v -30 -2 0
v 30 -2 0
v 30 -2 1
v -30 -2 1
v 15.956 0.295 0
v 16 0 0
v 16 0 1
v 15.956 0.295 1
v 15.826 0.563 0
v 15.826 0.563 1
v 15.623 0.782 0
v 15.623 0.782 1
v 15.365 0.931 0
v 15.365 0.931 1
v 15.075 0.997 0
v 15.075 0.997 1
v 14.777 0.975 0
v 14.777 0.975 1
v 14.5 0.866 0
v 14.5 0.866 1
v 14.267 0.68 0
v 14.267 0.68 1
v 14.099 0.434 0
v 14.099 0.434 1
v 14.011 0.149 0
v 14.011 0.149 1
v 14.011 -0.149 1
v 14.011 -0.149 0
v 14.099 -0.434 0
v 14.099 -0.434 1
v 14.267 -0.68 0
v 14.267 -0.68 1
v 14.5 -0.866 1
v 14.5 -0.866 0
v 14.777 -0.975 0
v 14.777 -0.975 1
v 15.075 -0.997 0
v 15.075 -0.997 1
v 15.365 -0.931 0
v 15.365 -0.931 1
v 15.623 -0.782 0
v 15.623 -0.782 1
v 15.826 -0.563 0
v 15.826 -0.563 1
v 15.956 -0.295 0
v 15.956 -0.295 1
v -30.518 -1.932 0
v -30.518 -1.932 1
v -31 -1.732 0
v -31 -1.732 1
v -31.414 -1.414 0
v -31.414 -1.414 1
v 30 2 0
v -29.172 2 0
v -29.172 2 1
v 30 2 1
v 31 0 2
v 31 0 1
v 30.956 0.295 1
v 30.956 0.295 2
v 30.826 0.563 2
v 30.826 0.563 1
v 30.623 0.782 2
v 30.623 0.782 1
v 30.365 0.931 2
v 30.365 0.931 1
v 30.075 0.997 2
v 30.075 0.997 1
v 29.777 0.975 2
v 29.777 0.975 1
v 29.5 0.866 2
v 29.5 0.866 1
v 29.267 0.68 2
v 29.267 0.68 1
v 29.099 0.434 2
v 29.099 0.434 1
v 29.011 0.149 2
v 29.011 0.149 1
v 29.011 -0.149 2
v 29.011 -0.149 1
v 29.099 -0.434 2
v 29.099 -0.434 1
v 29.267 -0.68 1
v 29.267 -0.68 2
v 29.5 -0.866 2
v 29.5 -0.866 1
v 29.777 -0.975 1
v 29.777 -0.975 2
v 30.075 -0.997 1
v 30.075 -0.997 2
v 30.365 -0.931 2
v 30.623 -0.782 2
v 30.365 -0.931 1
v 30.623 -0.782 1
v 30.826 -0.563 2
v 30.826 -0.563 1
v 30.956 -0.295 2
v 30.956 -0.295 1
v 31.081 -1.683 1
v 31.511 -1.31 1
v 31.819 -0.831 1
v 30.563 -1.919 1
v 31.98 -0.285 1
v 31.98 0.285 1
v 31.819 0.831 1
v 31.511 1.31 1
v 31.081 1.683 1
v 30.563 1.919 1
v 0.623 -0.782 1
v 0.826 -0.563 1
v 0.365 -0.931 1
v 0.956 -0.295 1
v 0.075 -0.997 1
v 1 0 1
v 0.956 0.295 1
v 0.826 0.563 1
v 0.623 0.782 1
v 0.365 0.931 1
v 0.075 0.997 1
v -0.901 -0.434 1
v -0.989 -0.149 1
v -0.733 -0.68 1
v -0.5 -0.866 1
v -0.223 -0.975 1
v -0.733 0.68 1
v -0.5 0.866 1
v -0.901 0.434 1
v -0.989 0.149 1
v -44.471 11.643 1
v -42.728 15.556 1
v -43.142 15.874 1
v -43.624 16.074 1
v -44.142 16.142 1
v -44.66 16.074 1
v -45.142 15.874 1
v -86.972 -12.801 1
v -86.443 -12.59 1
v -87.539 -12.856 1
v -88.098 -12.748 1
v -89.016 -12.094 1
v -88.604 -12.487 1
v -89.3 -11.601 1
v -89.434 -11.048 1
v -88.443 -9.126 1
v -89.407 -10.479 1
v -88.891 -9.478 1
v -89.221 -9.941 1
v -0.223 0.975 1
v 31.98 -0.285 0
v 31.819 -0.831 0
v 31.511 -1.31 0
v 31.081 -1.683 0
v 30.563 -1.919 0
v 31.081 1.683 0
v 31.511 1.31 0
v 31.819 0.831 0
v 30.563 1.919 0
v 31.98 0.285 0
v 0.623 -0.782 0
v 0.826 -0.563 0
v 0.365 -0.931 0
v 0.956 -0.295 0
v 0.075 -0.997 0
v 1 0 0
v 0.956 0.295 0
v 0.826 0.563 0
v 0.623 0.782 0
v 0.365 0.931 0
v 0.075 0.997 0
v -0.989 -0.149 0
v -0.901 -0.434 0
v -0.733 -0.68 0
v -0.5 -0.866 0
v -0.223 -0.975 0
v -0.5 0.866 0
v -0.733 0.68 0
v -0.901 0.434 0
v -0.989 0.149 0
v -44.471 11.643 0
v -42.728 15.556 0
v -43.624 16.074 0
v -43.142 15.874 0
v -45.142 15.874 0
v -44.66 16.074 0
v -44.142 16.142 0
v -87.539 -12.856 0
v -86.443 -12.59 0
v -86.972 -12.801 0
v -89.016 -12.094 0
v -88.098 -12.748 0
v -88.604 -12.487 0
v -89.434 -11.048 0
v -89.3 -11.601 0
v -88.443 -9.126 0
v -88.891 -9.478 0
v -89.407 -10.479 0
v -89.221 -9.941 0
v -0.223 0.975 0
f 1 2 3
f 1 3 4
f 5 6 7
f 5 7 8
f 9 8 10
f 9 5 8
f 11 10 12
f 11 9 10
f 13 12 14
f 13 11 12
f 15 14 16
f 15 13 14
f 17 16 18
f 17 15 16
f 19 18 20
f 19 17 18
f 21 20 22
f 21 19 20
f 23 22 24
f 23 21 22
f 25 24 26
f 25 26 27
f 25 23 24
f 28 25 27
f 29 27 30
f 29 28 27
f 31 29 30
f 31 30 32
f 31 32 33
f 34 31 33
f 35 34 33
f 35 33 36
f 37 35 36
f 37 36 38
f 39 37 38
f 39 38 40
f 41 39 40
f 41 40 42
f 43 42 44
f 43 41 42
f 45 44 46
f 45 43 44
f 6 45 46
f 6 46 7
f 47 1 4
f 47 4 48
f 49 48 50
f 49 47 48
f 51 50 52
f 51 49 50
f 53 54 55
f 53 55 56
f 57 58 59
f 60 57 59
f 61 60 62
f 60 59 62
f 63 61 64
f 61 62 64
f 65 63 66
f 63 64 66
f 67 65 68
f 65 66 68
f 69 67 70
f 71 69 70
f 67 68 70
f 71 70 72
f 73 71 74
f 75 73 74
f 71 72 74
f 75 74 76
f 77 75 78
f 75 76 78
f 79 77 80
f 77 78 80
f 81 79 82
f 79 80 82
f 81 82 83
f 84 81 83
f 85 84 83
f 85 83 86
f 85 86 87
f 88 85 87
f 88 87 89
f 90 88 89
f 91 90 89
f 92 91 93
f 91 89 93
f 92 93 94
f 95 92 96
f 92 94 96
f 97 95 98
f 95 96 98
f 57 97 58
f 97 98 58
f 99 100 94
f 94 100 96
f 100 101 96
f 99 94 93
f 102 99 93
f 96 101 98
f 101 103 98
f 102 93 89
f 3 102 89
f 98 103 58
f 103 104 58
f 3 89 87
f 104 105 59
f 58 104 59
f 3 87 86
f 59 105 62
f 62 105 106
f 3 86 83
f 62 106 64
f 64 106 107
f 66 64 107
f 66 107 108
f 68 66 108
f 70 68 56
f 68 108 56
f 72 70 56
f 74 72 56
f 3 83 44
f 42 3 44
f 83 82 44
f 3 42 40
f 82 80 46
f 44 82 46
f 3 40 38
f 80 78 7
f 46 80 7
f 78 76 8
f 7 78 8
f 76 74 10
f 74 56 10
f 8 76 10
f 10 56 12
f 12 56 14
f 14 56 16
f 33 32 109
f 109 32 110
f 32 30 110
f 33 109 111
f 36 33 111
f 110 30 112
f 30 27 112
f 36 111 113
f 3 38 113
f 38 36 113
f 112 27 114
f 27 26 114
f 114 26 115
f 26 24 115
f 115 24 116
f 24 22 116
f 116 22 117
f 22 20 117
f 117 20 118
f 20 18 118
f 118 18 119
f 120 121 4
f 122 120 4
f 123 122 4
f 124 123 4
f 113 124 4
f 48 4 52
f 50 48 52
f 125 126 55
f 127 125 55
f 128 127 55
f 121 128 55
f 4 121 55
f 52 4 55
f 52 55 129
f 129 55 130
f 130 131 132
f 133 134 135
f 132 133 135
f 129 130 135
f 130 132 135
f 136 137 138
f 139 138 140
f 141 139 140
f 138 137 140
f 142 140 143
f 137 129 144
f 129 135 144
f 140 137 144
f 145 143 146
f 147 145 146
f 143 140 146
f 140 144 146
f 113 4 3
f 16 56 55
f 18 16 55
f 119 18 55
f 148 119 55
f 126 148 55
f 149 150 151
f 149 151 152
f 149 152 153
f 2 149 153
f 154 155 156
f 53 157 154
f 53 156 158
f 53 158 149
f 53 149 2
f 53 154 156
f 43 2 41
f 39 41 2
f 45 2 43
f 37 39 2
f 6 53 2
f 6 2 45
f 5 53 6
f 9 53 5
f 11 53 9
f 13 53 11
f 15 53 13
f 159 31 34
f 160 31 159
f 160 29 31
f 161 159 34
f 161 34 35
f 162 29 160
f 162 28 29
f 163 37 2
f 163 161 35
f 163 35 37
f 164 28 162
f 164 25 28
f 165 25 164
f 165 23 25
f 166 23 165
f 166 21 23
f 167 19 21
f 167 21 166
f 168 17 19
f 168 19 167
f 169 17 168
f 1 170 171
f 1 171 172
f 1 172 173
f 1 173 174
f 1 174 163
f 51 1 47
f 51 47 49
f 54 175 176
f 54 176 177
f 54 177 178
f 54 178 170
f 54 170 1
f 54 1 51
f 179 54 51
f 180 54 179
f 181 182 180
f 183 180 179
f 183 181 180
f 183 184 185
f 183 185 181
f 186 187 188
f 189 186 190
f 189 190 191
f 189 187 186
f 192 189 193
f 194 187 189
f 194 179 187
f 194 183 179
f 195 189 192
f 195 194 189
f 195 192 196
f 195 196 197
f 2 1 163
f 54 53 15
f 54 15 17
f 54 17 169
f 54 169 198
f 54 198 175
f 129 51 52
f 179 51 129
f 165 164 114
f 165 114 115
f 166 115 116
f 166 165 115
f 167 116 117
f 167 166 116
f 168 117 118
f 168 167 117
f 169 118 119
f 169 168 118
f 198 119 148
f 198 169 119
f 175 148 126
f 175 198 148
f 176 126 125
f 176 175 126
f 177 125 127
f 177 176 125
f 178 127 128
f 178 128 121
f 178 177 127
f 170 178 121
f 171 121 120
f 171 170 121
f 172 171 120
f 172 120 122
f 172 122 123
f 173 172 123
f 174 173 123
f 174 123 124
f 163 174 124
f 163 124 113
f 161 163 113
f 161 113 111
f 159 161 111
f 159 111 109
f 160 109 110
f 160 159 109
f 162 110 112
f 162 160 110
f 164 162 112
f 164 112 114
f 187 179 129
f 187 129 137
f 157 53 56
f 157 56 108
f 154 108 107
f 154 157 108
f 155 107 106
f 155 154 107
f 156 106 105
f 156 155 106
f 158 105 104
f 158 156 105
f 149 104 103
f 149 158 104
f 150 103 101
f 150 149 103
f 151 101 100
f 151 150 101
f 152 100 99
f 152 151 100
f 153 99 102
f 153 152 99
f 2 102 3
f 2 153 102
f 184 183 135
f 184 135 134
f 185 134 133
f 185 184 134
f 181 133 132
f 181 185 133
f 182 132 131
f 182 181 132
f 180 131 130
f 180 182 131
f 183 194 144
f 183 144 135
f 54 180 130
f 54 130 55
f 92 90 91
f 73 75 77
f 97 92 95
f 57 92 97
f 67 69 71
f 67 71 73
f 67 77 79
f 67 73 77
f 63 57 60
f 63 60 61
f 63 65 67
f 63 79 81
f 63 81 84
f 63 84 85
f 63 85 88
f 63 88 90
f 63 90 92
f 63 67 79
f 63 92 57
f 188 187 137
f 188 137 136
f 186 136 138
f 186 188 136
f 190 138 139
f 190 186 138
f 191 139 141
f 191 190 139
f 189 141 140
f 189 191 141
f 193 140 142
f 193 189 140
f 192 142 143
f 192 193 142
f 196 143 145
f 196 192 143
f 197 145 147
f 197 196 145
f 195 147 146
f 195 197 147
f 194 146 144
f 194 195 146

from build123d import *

# Parameters (mm, degrees)
SKETCH_1_R      = 1
EXTRUDE_1_DEPTH = 1
SKETCH_2_R      = 1
EXTRUDE_2_DEPTH = 1


with BuildPart() as part:
    # 草图1 → 凸台-拉伸1 (new body)
    with BuildSketch(Plane.XY):
        with BuildLine():
            Line((0, 2), (30, 2))
            ThreePointArc((30, 2), (32, 0), (30, -2))
            Line((30, -2), (0, -2))
            Line((0, -2), (-30, -2))
            ThreePointArc((-30, -2), (-30.765366865, -1.847759065), (-31.414213562, -1.414213562))
            Line((-31.414213562, -1.414213562), (-44.471184953, 11.642757828))
            Line((-44.471184953, 11.642757828), (-86.443405813, -12.589915184))
            ThreePointArc((-86.443405813, -12.589915184), (-89.175456621, -11.857864376), (-88.443405813, -9.125813569))
            Line((-88.443405813, -9.125813569), (-45.142135624, 15.874186431))
            ThreePointArc((-45.142135624, 15.874186431), (-43.881083239, 16.125025346), (-42.727922061, 15.556349186))
            Line((-42.727922061, 15.556349186), (-29.171572875, 2))
            Line((-29.171572875, 2), (0, 2))
        make_face()
        with Locations((15, 0)):
            Circle(SKETCH_1_R, mode=Mode.SUBTRACT)
        Circle(SKETCH_1_R, mode=Mode.SUBTRACT)
    extrude(amount=EXTRUDE_1_DEPTH)

    # 草图2 → 凸台-拉伸2 (add)
    with BuildSketch(Plane.XY.offset(1)):
        with Locations((30, 0)):
            Circle(SKETCH_2_R)
    extrude(amount=EXTRUDE_2_DEPTH)


solid = part.part
